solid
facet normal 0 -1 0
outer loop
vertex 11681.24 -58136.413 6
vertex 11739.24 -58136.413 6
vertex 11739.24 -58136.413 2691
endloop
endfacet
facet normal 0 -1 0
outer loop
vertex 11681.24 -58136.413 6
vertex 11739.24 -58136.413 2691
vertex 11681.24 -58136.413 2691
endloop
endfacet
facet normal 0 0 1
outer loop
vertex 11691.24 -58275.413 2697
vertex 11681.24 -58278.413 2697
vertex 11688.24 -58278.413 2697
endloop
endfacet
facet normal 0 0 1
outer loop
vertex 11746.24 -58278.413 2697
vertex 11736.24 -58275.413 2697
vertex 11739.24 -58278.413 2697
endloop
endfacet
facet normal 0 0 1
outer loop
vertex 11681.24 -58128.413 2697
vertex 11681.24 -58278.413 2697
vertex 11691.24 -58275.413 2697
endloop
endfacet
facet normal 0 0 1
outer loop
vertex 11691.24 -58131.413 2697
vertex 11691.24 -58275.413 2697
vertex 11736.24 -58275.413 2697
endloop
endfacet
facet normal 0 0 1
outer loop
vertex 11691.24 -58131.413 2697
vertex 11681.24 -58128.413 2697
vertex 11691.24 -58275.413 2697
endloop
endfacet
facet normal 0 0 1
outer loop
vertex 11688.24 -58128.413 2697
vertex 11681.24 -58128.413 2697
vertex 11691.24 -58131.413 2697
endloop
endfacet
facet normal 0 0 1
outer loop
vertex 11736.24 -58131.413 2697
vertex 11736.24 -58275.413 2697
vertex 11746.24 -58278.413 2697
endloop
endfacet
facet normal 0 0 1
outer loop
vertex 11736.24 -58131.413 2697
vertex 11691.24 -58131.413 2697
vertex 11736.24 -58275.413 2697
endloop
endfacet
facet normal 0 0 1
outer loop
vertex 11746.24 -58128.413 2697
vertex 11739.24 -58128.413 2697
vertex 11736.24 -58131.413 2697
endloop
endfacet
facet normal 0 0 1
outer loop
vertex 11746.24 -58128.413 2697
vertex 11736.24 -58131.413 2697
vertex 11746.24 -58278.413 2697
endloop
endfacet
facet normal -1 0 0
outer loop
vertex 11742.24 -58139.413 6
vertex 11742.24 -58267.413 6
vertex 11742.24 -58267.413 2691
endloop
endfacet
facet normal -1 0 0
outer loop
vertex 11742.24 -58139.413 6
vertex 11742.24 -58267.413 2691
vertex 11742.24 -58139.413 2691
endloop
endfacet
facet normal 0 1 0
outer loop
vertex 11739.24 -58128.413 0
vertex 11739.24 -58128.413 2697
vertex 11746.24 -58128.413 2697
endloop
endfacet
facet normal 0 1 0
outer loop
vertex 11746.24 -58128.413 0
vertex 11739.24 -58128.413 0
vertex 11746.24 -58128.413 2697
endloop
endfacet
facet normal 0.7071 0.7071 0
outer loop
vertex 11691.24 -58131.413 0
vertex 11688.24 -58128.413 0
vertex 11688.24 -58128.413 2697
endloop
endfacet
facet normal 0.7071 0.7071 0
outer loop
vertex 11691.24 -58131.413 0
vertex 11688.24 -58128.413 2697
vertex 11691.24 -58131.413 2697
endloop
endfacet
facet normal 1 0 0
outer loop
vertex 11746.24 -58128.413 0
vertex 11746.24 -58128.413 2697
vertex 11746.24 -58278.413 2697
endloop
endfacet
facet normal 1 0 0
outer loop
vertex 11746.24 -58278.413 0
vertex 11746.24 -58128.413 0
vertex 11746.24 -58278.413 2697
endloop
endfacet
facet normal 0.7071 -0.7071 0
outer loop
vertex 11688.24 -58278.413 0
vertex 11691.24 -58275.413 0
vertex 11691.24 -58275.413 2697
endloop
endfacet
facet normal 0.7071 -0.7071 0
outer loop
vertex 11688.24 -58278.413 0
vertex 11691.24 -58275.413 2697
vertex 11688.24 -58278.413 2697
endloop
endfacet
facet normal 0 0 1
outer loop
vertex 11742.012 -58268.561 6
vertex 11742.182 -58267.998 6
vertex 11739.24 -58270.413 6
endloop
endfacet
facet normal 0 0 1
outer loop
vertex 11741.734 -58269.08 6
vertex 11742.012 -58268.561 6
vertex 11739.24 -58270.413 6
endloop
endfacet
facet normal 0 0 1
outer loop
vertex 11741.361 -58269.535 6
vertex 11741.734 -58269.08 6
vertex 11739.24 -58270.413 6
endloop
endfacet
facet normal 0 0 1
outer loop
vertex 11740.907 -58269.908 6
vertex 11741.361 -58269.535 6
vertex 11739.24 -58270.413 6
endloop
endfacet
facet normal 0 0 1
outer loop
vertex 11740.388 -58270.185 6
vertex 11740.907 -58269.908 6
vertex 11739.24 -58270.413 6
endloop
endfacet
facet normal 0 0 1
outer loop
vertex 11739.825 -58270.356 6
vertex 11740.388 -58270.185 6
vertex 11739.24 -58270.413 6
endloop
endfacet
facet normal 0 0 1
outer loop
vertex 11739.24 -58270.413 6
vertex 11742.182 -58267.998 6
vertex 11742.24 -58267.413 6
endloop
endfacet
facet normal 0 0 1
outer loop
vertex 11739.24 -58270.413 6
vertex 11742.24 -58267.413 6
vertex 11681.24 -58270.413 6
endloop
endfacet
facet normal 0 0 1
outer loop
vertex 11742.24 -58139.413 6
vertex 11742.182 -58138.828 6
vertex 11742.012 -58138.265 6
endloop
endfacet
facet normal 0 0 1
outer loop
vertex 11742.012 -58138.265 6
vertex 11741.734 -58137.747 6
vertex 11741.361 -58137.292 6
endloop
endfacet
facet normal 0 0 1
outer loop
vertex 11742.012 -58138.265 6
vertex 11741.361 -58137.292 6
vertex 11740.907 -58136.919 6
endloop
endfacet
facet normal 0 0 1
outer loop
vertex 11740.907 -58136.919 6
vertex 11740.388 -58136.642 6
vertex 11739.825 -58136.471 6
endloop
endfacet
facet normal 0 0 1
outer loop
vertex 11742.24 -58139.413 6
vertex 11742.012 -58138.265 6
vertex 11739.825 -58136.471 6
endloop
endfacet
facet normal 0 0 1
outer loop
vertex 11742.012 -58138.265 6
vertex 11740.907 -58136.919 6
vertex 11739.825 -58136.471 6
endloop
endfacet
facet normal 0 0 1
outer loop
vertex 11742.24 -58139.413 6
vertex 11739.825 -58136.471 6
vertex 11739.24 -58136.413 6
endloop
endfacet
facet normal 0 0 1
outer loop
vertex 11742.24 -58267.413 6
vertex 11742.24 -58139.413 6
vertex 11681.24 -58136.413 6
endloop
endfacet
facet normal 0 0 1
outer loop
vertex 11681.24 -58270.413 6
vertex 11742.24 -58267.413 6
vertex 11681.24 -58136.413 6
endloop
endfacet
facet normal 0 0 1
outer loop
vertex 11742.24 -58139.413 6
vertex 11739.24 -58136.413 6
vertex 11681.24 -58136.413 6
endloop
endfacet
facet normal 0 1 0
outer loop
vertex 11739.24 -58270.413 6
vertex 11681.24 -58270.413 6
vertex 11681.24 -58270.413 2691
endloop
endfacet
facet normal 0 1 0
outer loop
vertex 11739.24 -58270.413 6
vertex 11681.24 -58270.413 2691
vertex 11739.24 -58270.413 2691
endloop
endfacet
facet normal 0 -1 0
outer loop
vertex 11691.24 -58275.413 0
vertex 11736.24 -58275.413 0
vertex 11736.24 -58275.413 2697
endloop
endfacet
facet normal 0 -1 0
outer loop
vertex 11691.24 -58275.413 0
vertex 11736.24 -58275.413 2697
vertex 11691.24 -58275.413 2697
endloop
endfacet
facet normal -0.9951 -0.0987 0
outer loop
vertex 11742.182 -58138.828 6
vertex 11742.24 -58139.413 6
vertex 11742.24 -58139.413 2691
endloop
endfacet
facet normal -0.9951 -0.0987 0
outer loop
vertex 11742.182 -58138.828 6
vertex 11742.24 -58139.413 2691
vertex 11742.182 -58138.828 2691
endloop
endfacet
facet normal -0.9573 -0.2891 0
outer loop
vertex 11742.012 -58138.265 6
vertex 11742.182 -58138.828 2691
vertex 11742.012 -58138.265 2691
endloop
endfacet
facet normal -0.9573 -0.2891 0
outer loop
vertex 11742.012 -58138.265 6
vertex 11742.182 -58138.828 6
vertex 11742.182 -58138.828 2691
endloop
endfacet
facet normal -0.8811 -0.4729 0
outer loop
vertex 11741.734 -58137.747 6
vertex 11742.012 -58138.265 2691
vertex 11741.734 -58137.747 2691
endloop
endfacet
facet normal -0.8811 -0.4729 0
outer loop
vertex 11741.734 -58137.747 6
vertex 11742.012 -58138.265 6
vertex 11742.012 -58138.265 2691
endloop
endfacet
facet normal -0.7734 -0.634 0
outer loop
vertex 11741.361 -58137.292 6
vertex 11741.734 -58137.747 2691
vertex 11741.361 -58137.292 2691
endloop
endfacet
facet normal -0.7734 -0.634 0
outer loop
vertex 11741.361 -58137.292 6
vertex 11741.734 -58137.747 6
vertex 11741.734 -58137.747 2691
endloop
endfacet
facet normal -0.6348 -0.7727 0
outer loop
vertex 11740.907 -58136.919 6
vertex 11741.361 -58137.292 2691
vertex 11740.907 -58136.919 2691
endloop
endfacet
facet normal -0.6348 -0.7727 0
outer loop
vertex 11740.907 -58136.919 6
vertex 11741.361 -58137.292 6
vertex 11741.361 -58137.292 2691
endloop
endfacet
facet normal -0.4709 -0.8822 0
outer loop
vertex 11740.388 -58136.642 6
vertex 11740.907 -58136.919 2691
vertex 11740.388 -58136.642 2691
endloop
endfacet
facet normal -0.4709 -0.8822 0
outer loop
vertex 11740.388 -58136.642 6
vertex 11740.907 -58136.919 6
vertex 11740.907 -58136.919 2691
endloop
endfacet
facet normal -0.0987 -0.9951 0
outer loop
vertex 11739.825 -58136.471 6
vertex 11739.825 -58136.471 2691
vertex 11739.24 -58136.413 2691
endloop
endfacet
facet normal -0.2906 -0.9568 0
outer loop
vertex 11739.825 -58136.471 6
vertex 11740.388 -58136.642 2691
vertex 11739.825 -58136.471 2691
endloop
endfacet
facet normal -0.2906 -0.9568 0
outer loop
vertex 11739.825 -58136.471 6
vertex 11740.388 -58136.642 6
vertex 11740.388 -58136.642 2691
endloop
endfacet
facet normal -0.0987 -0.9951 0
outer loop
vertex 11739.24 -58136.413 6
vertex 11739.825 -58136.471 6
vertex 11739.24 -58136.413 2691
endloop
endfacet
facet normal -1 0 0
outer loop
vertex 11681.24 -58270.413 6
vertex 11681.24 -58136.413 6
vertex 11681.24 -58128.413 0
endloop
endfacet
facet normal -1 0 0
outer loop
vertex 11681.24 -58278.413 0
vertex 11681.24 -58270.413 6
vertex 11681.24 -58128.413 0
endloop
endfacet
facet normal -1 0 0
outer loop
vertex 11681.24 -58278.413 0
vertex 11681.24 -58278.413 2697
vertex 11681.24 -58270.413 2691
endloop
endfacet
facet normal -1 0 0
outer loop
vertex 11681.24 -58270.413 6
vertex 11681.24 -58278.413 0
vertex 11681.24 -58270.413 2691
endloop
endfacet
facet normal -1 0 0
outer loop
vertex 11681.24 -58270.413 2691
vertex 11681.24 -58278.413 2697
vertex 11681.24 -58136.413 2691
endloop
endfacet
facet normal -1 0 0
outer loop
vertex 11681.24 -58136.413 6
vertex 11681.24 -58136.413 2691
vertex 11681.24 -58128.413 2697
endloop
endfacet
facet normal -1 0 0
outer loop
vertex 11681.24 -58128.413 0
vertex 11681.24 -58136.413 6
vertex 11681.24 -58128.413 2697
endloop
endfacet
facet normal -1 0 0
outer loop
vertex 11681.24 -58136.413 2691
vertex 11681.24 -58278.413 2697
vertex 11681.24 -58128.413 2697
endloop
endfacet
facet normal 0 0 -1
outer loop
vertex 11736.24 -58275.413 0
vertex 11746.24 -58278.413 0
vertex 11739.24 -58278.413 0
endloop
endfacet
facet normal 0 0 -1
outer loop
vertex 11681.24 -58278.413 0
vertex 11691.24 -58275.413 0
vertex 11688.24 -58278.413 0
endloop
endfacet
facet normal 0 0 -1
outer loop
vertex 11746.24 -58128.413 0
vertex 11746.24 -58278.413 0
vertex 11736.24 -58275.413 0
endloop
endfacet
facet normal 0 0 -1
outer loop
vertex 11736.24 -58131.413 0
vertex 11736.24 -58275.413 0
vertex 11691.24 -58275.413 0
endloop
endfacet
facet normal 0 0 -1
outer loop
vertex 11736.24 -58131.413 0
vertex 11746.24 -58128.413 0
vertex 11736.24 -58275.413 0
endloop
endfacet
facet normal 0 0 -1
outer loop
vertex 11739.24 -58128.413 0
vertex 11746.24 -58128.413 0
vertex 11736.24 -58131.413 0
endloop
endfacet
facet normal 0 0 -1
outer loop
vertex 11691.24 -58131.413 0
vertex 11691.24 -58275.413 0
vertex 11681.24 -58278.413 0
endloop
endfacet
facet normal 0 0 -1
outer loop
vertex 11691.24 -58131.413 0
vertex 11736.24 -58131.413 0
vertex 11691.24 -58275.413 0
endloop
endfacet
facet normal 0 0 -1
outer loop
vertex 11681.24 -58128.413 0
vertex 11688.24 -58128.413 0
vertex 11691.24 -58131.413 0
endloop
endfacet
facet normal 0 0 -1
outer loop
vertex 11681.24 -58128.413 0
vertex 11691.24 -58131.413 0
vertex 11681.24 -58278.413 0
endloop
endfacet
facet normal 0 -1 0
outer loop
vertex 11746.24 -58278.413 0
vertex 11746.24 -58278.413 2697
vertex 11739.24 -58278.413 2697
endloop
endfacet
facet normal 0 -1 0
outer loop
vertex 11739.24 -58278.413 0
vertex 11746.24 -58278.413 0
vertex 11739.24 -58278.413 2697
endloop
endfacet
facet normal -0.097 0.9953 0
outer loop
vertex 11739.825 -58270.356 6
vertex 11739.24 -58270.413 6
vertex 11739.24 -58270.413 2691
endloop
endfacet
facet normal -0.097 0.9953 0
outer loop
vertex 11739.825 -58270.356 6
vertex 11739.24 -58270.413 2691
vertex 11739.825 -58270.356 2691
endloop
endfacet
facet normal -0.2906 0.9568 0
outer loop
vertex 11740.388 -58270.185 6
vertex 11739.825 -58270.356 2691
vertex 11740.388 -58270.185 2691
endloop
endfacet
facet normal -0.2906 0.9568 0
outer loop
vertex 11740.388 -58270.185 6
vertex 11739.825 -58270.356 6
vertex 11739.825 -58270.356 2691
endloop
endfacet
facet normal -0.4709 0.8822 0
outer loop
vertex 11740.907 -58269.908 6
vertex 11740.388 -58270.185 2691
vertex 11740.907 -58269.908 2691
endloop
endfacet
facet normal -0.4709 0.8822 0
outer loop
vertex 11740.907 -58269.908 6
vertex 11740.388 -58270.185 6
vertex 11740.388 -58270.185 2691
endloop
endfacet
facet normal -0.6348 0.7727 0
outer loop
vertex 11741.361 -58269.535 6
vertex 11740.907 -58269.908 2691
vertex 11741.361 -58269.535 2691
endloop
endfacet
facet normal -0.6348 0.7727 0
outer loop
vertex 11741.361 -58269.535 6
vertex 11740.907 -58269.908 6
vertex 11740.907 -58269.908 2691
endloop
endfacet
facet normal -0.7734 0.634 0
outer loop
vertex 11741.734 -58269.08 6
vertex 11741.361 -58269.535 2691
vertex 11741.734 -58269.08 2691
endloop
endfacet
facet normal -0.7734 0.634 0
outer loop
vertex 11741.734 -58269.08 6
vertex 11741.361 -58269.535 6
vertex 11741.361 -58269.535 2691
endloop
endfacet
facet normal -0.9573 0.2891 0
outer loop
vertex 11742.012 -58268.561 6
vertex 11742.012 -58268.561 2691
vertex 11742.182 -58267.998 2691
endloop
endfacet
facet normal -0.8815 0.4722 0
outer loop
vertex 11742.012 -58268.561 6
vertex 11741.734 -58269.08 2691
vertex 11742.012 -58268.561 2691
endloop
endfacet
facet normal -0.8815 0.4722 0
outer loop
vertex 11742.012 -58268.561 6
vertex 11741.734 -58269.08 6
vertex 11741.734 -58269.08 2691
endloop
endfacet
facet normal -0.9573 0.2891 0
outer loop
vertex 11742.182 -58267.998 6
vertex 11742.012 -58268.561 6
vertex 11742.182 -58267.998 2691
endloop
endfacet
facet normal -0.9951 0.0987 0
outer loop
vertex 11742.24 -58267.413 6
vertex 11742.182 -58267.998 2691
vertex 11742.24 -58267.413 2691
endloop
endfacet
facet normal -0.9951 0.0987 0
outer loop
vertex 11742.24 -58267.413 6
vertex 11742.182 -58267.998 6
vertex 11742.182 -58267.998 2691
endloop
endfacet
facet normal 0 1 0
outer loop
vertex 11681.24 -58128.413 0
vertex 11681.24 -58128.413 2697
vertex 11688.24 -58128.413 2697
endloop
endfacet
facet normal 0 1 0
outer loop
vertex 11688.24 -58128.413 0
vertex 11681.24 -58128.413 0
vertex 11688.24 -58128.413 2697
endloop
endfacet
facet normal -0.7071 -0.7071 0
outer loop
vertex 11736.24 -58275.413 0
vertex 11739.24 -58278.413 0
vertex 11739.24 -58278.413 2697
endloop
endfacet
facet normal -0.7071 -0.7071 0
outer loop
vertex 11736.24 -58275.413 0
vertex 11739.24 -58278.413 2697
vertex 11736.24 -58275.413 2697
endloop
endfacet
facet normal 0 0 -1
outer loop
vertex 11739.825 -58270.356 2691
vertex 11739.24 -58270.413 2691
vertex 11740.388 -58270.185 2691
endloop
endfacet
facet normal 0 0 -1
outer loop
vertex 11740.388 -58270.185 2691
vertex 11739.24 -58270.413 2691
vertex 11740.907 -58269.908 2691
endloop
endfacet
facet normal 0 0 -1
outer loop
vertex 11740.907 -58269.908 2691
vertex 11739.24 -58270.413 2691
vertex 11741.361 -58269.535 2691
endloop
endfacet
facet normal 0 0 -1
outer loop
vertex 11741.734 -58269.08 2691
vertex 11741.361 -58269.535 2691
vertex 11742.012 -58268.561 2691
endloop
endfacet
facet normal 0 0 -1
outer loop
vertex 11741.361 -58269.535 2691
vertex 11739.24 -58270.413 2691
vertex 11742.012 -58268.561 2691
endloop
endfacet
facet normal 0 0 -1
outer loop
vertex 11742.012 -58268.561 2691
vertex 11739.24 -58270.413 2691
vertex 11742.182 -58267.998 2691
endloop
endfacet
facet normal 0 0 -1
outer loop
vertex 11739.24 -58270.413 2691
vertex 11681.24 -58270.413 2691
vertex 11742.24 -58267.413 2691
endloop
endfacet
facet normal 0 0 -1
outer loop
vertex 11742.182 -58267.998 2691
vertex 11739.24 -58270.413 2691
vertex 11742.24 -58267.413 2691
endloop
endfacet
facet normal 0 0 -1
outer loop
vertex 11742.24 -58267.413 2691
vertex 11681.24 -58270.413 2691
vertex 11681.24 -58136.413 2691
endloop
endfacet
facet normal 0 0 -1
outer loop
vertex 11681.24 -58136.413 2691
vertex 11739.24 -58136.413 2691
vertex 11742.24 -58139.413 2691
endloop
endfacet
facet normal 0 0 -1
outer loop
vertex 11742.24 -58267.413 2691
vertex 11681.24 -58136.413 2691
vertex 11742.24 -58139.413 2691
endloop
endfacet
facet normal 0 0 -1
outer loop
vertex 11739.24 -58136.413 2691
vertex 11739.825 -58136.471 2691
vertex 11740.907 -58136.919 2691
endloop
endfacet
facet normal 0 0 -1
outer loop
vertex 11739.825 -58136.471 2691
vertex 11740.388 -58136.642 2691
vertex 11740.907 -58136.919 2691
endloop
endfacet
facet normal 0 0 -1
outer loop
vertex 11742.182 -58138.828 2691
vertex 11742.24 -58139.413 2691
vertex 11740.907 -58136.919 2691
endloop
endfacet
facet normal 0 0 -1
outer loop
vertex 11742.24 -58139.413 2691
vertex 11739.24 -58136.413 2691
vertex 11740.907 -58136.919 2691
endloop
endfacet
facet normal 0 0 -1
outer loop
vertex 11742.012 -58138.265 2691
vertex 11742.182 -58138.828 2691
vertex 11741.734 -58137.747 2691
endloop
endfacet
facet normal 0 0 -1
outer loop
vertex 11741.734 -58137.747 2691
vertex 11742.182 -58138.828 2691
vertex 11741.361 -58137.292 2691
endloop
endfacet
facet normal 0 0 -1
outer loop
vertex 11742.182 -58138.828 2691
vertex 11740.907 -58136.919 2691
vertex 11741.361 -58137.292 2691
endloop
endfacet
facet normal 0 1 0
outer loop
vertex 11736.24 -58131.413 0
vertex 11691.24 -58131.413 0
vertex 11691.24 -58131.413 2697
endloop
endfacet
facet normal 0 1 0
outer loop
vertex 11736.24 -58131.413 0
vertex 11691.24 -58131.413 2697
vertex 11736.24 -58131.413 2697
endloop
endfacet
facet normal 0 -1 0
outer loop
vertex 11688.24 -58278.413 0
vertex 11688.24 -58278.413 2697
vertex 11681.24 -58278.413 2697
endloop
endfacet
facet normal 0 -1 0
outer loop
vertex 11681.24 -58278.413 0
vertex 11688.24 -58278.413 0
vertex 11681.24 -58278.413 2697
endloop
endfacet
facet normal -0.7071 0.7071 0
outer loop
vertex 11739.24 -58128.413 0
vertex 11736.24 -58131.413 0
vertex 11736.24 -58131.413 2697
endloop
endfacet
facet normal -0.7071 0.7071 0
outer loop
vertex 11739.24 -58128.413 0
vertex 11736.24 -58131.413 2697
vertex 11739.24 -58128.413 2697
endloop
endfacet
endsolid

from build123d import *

# Parameters (mm, degrees)
EXTRUDE_1_DEPTH = 2697
SKETCH_2_W      = 61
SKETCH_2_H      = 134
EXTRUDE_2_DEPTH = 6
SKETCH_3_W      = 61
SKETCH_3_H      = 134
EXTRUDE_3_DEPTH = 6


with BuildPart() as part:
    # Model → 凸台-拉伸1 (new body)
    with BuildSketch(Plane.XY):
        with BuildLine():
            Line((11739.240027423, -58278.413223948), (11736.240027423, -58275.413223948))
            Line((11736.240027423, -58275.413223948), (11691.240027423, -58275.413223948))
            Line((11691.240027423, -58275.413223948), (11688.240027423, -58278.413223948))
            Line((11688.240027423, -58278.413223948), (11681.240027423, -58278.413223948))
            Line((11681.240027423, -58278.413223948), (11681.240027423, -58270.413223948))
            Line((11681.240027423, -58270.413223948), (11739.240027423, -58270.413223948))
            ThreePointArc((11739.240027423, -58270.413223948), (11741.361347766, -58269.534544291), (11742.240027423, -58267.413223948))
            Line((11742.240027423, -58267.413223948), (11742.240027423, -58139.413223948))
            ThreePointArc((11742.240027423, -58139.413223948), (11741.361347766, -58137.291903604), (11739.240027423, -58136.413223948))
            Line((11739.240027423, -58136.413223948), (11681.240027423, -58136.413223948))
            Line((11681.240027423, -58136.413223948), (11681.240027423, -58128.413223948))
            Line((11681.240027423, -58128.413223948), (11688.240027423, -58128.413223948))
            Line((11688.240027423, -58128.413223948), (11691.240027423, -58131.413223948))
            Line((11691.240027423, -58131.413223948), (11736.240027423, -58131.413223948))
            Line((11736.240027423, -58131.413223948), (11739.240027423, -58128.413223948))
            Line((11739.240027423, -58128.413223948), (11746.240027423, -58128.413223948))
            Line((11746.240027423, -58128.413223948), (11746.240027423, -58278.413223948))
            Line((11746.240027423, -58278.413223948), (11739.240027423, -58278.413223948))
        make_face()
    extrude(amount=EXTRUDE_1_DEPTH)

    # 草图2 → 凸台-拉伸2 (add)
    with BuildSketch(Plane.XY.offset(2697)):
        with Locations((11711.740027423, -58203.413223948)):
            Rectangle(SKETCH_2_W, SKETCH_2_H)
    extrude(amount=-EXTRUDE_2_DEPTH)

    # 草图3 → 凸台-拉伸3 (add)
    with BuildSketch(Plane(origin=(0, 0, 0), x_dir=(-1, 0, 0), z_dir=(0, 0, -1))):
        with Locations((-11711.740027423, -58203.413223948)):
            Rectangle(SKETCH_3_W, SKETCH_3_H)
    extrude(amount=-EXTRUDE_3_DEPTH)


solid = part.part
